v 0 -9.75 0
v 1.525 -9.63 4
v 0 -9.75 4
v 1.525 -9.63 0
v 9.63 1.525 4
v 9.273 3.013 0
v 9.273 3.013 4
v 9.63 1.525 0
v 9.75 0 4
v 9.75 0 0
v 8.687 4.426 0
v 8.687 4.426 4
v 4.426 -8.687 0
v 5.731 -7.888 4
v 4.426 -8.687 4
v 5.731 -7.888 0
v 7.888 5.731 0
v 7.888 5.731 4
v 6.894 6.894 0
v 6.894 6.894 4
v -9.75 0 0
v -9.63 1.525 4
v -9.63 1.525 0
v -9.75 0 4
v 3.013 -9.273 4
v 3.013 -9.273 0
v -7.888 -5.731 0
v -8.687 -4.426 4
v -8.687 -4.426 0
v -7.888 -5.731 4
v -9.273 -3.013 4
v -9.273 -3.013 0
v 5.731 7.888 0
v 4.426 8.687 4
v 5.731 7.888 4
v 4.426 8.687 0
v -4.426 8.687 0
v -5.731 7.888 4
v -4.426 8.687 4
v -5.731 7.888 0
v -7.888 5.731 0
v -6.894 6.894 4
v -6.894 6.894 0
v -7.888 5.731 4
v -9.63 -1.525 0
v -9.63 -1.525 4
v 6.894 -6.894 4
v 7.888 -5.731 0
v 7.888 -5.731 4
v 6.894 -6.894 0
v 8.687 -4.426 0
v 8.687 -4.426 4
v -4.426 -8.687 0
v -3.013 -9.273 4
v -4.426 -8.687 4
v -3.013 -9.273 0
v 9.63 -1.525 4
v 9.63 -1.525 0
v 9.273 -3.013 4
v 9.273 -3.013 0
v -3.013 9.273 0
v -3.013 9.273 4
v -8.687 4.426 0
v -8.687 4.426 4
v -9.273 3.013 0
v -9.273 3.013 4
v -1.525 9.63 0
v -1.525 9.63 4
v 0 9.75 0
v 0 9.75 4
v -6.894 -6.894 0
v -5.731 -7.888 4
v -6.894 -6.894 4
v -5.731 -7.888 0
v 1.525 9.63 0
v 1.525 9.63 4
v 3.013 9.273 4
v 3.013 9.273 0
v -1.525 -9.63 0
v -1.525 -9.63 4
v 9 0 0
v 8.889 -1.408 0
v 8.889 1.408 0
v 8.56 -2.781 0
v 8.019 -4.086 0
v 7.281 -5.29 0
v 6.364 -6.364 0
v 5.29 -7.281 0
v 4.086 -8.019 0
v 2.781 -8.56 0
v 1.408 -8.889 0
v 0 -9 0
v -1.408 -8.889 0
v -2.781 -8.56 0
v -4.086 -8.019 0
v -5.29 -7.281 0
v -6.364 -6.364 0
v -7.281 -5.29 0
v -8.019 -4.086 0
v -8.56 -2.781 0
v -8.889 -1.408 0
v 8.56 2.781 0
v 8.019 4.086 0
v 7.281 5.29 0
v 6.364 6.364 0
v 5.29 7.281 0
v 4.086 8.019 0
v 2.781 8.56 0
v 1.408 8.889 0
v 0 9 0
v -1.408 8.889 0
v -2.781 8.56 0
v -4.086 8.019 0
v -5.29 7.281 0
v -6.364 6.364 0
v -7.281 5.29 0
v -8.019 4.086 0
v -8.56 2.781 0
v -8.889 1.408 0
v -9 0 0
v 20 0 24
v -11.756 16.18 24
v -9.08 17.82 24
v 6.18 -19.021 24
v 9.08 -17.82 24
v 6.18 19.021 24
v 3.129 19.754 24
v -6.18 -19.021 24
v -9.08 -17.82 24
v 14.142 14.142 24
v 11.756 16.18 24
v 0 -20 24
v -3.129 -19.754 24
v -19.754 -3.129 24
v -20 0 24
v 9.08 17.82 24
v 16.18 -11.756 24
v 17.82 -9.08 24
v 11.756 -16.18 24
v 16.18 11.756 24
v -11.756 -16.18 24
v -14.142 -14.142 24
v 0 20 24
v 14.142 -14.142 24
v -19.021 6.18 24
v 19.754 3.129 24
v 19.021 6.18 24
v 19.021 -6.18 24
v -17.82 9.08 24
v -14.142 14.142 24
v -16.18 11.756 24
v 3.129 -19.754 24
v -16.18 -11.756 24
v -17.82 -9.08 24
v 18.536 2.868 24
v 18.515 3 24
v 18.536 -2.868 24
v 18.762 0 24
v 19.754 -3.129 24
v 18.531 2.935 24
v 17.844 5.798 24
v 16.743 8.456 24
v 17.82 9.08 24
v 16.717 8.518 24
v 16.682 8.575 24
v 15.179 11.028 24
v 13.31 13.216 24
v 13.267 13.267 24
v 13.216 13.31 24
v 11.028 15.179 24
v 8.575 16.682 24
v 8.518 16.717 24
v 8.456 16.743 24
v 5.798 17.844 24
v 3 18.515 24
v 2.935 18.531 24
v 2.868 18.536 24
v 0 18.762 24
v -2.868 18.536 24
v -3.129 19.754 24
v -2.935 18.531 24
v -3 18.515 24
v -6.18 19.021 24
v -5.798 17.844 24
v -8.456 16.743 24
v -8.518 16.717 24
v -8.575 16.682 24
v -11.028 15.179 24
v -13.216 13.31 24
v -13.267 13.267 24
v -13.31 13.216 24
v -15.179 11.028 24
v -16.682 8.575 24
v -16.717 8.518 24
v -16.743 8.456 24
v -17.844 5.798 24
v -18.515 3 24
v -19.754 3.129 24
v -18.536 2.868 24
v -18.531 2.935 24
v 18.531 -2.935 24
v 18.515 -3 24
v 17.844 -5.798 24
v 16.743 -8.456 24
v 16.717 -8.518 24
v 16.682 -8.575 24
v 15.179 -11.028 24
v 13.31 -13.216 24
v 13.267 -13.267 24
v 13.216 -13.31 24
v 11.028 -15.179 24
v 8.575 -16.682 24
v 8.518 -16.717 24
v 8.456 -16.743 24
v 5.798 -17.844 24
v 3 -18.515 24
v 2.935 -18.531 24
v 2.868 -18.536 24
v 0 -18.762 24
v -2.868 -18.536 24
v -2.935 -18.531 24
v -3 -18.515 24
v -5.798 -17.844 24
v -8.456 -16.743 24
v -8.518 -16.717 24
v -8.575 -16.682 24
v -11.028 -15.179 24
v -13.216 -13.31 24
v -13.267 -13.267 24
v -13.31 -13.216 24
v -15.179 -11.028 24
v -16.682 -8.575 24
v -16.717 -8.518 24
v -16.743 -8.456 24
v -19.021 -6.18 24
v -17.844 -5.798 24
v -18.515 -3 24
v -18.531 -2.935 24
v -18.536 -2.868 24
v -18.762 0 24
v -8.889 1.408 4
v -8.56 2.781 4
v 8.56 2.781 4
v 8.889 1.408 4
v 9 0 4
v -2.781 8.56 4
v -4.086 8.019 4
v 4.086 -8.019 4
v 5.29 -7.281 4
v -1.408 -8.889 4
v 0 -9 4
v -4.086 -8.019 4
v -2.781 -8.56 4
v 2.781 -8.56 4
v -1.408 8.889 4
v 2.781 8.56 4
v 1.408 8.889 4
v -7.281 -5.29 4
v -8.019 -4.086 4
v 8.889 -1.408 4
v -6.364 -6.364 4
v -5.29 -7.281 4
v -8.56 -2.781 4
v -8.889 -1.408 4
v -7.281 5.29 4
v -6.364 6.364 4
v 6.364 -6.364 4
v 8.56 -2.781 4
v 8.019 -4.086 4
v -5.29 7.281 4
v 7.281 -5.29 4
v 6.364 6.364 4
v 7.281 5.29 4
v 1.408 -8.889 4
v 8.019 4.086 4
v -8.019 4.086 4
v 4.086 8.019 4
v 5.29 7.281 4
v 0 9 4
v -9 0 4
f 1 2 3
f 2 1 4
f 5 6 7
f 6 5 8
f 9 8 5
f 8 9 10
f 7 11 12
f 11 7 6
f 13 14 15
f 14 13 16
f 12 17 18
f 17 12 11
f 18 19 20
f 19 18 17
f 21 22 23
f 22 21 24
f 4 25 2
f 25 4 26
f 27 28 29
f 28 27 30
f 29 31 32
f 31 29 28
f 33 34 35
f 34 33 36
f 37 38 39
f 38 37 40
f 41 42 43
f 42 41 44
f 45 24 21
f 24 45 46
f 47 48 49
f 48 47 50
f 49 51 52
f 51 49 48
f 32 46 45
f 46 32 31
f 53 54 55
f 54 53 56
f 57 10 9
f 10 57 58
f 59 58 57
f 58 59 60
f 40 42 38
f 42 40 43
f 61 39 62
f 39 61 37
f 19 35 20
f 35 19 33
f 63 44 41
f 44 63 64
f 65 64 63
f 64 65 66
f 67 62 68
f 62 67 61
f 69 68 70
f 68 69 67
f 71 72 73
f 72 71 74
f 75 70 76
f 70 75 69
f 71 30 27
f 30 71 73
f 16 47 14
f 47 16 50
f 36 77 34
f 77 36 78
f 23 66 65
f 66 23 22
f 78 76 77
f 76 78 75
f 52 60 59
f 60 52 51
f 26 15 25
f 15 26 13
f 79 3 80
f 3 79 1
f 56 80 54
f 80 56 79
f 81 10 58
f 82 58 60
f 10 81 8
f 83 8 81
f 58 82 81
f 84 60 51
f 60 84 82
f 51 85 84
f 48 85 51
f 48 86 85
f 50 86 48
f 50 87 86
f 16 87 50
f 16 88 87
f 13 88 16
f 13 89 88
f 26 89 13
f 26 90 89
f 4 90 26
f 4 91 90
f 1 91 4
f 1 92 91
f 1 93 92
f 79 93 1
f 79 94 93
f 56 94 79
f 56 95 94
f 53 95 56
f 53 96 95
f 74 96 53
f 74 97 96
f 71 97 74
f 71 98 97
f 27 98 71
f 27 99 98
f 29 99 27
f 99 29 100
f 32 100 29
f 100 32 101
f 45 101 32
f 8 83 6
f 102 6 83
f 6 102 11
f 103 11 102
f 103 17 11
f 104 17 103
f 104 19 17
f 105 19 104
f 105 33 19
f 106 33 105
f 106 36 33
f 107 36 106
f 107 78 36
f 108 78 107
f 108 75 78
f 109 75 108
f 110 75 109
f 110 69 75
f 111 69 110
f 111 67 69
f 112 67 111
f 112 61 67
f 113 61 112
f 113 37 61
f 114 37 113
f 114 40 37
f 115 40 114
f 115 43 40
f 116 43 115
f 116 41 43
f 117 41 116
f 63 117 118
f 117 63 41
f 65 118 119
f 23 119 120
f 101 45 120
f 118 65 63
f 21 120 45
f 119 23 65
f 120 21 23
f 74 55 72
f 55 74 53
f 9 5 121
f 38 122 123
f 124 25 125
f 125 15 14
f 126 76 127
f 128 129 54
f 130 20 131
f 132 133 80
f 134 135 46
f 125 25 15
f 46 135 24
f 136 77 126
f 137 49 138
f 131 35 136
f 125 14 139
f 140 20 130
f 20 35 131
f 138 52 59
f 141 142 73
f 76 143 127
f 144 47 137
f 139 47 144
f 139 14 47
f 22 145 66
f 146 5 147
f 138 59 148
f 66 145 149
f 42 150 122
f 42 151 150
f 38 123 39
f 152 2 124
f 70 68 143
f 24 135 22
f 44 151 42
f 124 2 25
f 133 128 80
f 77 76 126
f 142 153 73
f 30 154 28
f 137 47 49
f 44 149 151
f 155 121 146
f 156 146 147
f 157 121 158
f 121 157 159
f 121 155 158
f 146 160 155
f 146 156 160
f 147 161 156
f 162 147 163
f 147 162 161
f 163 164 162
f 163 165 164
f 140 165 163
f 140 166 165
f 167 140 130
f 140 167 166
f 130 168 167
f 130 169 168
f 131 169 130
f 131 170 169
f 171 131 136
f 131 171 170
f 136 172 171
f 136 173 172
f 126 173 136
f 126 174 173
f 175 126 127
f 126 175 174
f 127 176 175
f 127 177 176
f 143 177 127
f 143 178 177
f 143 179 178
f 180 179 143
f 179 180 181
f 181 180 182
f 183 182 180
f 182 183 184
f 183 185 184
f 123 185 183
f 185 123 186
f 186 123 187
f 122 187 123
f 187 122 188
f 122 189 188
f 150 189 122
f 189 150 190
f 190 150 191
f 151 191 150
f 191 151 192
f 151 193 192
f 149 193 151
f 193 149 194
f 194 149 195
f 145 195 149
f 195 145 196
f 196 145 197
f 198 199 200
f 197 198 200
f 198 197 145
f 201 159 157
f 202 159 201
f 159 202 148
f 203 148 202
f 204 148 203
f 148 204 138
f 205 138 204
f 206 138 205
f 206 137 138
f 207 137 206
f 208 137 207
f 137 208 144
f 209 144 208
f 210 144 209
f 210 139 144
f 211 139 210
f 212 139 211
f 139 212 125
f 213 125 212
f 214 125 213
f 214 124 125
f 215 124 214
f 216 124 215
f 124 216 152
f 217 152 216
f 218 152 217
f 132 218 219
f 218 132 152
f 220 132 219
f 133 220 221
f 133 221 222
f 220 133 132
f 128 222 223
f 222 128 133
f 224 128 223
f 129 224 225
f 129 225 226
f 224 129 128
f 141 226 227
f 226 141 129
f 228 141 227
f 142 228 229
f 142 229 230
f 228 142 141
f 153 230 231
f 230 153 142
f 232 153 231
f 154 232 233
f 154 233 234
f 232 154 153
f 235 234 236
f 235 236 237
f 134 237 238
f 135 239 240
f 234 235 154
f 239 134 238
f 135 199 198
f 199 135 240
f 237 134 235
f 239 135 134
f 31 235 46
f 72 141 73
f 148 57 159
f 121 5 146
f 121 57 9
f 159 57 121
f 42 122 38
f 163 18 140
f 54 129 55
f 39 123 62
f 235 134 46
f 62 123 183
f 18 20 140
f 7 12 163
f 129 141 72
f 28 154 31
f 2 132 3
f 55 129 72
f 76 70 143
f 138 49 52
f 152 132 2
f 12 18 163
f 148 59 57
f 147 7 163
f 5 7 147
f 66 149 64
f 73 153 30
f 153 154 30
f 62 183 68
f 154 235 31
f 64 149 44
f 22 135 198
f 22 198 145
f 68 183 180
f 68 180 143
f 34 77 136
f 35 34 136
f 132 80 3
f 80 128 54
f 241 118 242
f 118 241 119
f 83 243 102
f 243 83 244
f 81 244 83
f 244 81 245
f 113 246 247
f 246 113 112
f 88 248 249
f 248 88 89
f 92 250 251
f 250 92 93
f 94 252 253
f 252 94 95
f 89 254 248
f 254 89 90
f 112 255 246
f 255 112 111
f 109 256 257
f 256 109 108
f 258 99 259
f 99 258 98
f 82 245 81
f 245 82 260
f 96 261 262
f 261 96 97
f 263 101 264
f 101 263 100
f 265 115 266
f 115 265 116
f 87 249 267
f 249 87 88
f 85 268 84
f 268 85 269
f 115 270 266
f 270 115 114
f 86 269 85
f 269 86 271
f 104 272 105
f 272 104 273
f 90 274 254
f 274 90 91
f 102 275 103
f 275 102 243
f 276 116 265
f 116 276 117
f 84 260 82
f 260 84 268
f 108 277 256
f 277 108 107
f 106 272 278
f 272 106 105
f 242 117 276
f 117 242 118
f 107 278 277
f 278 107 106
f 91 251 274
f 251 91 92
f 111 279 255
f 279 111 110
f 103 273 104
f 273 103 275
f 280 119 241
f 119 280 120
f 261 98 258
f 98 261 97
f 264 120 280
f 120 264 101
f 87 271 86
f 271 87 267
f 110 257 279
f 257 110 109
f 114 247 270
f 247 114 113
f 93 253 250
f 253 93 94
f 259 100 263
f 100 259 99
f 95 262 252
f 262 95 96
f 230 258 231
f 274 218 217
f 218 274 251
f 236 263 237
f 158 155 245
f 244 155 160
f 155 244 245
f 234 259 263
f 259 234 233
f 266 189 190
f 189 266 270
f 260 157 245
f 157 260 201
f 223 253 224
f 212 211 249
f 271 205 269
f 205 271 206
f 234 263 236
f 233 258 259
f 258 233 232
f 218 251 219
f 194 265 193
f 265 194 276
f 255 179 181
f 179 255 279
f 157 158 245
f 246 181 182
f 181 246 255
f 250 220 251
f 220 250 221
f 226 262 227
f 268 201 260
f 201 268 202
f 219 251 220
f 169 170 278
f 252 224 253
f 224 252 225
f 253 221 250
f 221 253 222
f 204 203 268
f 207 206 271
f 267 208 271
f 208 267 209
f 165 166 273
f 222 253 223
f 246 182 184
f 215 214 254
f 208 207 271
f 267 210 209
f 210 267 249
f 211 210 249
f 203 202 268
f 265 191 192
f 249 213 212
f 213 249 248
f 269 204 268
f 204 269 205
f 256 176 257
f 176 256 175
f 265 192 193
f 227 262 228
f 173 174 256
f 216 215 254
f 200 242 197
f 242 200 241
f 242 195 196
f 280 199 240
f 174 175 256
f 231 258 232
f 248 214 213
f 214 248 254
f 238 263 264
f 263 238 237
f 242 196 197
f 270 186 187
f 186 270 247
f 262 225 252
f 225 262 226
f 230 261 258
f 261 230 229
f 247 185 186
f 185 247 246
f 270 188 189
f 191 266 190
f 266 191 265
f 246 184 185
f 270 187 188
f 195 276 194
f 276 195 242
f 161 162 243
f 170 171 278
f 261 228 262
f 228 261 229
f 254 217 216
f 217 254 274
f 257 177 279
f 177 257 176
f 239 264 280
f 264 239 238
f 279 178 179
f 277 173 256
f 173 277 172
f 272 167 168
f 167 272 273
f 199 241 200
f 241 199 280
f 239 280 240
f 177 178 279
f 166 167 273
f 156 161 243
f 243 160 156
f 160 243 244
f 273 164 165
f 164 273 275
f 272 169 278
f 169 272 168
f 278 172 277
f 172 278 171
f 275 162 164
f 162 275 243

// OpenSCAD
$fn=40;

thickness = 1.5;

neck_dia = 19.5;
neck_height = 4;

body_height = 20;
body_dia = 40;

difference()
{
	union()
	{
		cylinder(h=neck_height, d=neck_dia);
		translate([0, 0, neck_height]) cylinder(h=body_height, d1=neck_dia, d2=body_dia);
	}

	union()
	{
		cylinder(h=neck_height + 1, d=neck_dia-thickness);
		translate([0, 0, neck_height]) cylinder(h=body_height+1, d1=neck_dia-thickness, d2=body_dia-thickness);
	}
}
